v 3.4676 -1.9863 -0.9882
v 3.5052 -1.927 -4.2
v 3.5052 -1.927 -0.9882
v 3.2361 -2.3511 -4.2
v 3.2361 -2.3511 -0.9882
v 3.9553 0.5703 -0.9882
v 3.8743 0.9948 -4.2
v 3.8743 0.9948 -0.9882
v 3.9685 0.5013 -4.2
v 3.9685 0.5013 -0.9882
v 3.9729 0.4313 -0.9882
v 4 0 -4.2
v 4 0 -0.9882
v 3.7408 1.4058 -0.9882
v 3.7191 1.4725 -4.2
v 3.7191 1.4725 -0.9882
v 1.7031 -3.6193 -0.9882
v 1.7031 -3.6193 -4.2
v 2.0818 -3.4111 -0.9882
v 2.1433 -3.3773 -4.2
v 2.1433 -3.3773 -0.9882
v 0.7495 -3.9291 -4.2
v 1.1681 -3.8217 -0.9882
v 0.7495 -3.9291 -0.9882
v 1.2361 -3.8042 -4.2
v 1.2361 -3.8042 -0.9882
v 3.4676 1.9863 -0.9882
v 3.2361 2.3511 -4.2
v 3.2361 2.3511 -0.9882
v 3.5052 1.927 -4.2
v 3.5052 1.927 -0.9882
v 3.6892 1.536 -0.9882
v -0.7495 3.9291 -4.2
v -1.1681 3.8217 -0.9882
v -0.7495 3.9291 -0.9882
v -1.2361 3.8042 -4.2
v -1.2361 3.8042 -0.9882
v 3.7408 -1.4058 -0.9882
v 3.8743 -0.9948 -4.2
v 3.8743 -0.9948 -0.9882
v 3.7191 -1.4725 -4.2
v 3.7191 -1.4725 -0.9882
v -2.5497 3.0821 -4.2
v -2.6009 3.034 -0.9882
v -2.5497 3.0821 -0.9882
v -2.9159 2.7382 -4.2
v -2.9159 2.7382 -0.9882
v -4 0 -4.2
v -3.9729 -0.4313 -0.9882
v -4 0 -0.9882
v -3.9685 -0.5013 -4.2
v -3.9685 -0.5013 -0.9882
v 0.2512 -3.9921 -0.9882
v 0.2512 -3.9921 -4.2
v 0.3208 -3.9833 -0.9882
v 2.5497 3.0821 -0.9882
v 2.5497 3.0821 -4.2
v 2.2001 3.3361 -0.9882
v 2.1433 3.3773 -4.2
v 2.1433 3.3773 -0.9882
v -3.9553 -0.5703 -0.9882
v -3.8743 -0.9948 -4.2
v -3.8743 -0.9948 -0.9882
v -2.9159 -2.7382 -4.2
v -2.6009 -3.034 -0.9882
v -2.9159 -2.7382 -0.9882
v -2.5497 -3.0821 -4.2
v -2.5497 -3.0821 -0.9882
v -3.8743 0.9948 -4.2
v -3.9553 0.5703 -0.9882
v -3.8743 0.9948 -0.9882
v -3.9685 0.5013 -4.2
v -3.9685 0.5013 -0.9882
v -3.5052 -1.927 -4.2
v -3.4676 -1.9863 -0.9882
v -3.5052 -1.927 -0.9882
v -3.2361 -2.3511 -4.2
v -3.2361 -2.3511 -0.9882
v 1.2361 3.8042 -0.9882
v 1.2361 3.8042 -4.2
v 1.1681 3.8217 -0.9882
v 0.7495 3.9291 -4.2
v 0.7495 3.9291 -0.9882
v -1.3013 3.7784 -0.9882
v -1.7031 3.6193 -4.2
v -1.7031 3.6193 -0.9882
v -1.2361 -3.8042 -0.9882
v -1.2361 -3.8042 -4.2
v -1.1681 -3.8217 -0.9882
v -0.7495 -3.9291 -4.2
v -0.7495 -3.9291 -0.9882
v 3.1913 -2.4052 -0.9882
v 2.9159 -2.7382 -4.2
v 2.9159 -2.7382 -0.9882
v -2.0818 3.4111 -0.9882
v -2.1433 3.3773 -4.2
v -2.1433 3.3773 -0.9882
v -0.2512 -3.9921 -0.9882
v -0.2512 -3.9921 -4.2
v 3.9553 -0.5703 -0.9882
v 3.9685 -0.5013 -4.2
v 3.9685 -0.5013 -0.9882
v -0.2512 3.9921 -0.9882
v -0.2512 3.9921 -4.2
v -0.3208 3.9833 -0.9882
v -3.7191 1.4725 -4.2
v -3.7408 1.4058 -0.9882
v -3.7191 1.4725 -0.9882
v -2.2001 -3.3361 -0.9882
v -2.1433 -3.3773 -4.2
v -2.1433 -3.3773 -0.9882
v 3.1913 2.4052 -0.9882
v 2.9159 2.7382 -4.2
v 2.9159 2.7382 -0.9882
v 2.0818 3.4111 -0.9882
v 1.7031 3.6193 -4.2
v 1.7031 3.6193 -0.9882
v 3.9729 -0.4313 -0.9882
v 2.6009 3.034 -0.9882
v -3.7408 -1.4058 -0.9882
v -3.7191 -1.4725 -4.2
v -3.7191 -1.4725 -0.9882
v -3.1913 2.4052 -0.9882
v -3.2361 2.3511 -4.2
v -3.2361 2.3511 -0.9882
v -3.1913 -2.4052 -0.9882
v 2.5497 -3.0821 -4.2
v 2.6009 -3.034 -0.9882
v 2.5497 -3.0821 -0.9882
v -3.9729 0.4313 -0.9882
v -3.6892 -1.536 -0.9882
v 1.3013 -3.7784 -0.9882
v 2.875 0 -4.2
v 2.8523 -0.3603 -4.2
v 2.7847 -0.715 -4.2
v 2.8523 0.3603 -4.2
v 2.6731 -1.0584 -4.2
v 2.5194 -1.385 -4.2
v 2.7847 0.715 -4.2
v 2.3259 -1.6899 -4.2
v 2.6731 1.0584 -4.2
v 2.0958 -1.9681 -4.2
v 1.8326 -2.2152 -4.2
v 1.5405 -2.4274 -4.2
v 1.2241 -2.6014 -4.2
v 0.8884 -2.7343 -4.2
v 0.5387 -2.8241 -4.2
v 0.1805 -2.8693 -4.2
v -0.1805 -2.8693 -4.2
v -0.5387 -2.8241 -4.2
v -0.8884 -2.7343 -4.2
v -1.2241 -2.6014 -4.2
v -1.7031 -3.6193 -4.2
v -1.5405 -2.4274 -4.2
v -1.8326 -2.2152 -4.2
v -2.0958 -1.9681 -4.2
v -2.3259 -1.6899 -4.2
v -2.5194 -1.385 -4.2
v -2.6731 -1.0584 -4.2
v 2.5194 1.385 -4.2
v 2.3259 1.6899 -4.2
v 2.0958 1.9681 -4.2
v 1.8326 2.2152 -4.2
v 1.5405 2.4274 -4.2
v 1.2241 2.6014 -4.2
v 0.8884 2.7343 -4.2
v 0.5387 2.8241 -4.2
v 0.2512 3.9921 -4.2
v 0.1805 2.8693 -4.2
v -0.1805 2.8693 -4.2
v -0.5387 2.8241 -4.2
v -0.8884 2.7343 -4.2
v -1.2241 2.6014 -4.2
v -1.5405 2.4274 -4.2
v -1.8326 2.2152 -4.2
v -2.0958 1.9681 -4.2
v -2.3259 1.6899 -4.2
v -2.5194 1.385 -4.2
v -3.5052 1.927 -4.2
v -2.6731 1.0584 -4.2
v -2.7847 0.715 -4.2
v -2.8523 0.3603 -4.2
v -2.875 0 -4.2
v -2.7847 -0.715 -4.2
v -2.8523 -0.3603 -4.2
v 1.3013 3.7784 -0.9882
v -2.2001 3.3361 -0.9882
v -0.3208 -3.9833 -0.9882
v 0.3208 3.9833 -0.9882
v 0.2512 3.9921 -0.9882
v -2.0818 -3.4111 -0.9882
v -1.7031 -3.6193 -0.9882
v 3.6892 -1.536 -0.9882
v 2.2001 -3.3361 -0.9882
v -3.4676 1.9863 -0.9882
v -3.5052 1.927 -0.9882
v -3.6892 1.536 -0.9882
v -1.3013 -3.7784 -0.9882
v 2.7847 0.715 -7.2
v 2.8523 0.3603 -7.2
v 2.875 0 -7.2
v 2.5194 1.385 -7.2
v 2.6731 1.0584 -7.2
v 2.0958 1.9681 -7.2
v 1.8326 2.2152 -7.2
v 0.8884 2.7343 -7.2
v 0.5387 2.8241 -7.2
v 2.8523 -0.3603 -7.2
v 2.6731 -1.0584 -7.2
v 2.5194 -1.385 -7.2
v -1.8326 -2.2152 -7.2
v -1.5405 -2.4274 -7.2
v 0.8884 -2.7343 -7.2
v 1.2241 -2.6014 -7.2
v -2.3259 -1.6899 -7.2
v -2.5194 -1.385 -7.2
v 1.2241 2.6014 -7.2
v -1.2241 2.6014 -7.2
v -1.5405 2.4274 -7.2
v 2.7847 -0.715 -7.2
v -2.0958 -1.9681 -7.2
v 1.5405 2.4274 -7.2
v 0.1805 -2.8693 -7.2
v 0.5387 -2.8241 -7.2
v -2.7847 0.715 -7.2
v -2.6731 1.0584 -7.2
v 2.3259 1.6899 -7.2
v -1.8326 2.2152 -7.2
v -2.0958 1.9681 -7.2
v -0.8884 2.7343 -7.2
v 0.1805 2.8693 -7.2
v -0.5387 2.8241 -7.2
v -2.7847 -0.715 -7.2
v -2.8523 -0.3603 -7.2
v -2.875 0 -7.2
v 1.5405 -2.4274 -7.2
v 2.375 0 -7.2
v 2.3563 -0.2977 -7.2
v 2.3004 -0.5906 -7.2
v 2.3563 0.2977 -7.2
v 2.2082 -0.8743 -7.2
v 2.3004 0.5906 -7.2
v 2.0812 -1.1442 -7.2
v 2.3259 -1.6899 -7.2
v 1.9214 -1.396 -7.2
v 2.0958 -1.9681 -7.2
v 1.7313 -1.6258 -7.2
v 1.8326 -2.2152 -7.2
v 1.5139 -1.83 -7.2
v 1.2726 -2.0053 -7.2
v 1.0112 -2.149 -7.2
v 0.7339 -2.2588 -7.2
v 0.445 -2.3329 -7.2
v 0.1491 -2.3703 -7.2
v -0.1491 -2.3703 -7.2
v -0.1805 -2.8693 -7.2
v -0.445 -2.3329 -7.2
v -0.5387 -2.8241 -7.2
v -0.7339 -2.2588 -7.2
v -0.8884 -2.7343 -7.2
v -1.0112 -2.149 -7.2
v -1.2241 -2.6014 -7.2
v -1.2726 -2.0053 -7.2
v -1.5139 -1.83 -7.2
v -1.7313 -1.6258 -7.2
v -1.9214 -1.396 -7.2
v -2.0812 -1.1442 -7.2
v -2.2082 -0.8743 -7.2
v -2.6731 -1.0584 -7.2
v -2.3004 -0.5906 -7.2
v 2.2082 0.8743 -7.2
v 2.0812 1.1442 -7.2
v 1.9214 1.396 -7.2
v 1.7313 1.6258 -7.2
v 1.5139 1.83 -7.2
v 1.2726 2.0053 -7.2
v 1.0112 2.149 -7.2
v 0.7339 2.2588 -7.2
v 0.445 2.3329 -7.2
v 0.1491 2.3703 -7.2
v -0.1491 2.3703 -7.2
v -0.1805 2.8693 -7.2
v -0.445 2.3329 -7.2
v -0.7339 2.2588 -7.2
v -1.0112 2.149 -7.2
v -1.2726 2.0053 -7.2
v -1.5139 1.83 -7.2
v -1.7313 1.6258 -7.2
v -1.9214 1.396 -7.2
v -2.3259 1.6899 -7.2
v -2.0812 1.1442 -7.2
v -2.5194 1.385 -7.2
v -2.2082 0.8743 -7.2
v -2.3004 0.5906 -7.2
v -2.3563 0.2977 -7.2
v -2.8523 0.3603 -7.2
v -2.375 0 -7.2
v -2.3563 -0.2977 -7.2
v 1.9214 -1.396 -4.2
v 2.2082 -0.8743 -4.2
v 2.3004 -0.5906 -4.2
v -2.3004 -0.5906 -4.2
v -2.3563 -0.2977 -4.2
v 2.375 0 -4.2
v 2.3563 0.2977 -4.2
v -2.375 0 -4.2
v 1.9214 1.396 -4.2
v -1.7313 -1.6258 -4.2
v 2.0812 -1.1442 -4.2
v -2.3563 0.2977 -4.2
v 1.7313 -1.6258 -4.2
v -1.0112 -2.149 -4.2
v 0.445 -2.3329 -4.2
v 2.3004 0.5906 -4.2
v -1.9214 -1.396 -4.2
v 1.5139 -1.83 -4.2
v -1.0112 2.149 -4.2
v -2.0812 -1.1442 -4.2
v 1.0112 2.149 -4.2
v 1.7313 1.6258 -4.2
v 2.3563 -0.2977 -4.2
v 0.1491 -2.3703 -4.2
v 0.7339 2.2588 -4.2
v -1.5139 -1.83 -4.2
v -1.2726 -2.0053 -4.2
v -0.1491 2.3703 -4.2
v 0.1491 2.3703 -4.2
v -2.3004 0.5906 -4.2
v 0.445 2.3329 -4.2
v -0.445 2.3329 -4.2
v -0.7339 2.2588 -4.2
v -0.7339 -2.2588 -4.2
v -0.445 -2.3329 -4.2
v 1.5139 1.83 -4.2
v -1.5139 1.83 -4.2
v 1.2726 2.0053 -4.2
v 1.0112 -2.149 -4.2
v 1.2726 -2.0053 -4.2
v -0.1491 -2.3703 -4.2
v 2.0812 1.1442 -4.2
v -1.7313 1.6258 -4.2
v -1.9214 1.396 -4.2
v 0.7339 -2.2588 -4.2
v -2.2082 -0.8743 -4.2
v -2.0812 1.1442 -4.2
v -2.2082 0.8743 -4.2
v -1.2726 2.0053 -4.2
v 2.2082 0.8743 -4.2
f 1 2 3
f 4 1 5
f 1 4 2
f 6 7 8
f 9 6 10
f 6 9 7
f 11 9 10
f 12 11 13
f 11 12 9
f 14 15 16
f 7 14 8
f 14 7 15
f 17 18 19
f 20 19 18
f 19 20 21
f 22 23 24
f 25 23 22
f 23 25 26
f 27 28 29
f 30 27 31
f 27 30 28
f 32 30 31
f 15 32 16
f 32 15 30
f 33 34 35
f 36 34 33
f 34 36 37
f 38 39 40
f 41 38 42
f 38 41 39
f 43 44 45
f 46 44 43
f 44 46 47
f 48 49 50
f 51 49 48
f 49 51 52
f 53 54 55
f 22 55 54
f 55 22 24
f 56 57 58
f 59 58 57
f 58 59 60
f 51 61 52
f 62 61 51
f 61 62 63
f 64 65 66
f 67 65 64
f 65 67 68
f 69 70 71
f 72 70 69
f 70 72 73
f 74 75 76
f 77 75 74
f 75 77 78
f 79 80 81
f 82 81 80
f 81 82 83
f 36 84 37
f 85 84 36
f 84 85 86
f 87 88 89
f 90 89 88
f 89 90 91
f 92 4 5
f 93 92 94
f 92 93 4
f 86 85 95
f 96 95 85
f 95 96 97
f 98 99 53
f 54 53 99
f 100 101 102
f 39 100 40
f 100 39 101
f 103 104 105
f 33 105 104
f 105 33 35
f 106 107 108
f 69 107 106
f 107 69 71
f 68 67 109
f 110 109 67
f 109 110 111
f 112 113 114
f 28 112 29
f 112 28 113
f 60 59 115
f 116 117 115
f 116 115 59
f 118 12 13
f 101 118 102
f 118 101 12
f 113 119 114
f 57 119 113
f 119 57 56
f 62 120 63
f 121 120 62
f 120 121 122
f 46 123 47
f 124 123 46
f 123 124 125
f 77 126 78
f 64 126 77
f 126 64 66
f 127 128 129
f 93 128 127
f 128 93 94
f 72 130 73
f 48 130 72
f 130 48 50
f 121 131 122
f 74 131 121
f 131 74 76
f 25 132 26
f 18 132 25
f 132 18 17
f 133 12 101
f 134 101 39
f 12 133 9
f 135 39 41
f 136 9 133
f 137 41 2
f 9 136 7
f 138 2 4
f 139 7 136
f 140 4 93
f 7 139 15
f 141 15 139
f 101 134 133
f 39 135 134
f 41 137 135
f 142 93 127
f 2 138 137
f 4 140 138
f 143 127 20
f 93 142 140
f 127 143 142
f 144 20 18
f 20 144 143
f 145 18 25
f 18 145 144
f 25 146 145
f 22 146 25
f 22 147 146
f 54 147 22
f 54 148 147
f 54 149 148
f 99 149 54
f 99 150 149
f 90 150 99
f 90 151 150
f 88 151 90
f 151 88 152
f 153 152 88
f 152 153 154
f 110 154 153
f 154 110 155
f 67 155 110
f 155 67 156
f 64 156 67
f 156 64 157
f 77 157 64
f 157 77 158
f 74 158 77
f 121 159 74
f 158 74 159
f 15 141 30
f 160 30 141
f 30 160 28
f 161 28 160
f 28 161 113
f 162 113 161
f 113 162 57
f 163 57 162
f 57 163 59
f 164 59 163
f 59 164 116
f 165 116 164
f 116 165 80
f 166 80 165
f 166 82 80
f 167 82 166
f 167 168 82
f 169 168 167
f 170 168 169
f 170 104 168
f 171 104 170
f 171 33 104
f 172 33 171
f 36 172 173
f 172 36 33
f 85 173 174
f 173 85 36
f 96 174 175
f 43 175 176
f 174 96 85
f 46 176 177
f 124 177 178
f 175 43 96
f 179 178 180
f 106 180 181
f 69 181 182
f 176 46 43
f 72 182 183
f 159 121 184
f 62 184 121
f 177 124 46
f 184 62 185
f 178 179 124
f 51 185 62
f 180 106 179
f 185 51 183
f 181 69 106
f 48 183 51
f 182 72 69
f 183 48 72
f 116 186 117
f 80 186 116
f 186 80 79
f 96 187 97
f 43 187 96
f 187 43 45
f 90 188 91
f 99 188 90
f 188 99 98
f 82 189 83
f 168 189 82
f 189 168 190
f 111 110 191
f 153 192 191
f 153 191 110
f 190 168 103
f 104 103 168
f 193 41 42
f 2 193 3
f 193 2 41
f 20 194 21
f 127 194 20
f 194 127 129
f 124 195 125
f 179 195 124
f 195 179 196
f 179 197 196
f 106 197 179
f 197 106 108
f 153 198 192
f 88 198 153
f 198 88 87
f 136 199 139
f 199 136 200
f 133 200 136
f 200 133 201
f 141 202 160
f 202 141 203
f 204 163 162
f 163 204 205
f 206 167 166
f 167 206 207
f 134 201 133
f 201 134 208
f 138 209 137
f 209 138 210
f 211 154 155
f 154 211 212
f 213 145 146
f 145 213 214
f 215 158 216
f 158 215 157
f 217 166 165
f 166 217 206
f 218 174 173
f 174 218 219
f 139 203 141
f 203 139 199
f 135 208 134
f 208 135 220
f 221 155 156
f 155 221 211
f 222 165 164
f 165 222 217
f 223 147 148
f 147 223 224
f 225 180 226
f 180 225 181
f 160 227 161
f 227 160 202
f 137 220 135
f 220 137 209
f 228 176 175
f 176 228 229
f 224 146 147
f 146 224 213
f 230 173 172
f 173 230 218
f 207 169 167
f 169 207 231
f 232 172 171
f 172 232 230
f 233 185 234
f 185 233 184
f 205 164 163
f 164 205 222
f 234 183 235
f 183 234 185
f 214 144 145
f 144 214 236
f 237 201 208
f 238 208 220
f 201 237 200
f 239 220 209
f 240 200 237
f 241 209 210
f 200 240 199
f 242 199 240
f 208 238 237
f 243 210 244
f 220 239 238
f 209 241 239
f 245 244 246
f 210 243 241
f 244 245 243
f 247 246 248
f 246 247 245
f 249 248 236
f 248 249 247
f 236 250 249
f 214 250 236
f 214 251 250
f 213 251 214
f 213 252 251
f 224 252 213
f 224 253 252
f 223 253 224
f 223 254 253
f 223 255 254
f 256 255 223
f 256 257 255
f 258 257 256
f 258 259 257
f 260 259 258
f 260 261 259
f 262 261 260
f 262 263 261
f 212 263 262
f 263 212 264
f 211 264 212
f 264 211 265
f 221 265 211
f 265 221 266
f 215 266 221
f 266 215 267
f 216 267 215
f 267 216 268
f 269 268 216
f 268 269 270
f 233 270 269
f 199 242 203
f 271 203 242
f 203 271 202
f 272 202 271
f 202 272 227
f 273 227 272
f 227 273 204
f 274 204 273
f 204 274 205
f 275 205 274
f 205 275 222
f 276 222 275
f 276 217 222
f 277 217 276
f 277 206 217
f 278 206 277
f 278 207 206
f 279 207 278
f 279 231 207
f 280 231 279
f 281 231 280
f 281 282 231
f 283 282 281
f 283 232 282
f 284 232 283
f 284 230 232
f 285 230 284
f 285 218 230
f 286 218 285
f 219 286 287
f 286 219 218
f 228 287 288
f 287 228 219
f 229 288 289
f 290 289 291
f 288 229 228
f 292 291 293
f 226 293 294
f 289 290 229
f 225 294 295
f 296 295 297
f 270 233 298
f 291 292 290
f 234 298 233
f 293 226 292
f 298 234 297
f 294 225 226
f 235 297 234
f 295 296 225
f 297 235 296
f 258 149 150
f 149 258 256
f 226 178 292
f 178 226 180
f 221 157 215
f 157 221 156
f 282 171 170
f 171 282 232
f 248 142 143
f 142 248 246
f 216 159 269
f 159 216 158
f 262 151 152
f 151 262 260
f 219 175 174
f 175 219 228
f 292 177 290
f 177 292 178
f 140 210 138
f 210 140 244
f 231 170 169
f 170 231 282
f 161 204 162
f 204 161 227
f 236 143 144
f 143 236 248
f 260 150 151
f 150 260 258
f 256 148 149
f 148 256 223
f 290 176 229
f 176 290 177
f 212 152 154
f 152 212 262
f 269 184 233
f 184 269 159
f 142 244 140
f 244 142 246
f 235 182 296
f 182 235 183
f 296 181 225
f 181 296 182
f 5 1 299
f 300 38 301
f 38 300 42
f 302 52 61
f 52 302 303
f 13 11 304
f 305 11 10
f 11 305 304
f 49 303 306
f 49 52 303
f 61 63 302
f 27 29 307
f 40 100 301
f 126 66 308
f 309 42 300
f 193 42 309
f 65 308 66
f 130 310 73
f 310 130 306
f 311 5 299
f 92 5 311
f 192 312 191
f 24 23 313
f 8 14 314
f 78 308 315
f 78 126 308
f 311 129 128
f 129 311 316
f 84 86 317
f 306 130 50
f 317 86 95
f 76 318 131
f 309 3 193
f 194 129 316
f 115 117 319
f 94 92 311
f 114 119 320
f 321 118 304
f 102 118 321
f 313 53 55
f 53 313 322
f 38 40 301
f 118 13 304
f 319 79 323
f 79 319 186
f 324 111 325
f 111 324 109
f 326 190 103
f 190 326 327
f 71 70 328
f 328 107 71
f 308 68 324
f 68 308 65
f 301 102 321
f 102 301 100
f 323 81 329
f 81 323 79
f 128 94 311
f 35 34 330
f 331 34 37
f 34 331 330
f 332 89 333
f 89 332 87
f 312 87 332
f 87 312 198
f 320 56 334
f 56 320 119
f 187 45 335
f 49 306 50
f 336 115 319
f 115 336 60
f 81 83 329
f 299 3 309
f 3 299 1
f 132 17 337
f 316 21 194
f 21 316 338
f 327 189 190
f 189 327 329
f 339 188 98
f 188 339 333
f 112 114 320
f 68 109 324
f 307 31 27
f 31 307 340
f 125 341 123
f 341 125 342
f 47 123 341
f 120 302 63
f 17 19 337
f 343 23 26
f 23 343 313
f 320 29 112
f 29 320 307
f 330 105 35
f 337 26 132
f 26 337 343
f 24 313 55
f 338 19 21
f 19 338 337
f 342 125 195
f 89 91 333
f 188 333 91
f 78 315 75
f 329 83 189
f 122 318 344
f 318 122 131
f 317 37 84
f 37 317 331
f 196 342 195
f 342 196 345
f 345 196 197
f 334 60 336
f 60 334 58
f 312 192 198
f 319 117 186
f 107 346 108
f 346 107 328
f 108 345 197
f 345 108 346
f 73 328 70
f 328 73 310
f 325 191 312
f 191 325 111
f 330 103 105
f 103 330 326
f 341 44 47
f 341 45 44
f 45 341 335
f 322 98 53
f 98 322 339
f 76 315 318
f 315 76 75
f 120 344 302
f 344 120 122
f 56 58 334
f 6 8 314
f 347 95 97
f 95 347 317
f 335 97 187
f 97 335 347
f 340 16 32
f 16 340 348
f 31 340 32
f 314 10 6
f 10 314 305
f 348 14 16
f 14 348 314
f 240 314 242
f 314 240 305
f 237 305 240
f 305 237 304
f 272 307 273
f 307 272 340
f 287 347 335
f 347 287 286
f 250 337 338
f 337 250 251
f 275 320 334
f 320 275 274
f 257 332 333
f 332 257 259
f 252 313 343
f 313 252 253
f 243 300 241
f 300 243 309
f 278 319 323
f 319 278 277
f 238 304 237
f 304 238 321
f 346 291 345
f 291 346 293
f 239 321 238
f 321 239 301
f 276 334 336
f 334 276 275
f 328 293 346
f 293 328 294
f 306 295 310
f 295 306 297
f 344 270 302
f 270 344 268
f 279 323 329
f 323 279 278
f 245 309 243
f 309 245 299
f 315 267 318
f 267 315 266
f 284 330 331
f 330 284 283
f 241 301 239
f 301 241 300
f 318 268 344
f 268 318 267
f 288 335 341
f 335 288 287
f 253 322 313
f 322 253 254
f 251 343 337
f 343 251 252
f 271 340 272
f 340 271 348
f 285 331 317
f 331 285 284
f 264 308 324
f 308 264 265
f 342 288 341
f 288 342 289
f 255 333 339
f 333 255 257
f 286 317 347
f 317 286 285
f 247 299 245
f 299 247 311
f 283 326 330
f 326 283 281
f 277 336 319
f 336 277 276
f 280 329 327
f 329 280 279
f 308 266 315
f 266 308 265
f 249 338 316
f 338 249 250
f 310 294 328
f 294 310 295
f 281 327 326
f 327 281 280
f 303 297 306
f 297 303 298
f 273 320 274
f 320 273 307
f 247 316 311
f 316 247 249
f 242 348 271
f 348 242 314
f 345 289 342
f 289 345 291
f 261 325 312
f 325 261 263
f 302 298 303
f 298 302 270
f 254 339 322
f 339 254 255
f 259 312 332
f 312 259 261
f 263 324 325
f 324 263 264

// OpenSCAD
$fn = 50;

difference() {
	union() {
		translate(v = [0, 0, -4.2]) {
			cylinder(h = 7.2, r = 4.0);
		}
		#translate(v = [0, 0, -7.2]) {
			cylinder(h = 7.2, r = 2.875);
		}
	}
	union() {
		translate(v = [0, 0, 0]) {
			rotate(a = [0, 0, 0]) {
				difference() {
					union() {
						translate(v = [0, 0, -7.2]) {
							cylinder(h = 7.2, r = 2.25);
						}
						translate(v = [0, 0, -4.2]) {
							cylinder(h = 4.2, r1 = 2.375, r2 = 4.5);
						}
						translate(v = [0, 0, -7.2]) {
							cylinder(h = 7.2, r = 2.375);
						}
						translate(v = [0, 0, -7.2]) {
							cylinder(h = 7.2, r = 2.25);
						}
					}
					union();
				}
			}
		}
		#cylinder(h = 3, r = 5.0);
	}
}
